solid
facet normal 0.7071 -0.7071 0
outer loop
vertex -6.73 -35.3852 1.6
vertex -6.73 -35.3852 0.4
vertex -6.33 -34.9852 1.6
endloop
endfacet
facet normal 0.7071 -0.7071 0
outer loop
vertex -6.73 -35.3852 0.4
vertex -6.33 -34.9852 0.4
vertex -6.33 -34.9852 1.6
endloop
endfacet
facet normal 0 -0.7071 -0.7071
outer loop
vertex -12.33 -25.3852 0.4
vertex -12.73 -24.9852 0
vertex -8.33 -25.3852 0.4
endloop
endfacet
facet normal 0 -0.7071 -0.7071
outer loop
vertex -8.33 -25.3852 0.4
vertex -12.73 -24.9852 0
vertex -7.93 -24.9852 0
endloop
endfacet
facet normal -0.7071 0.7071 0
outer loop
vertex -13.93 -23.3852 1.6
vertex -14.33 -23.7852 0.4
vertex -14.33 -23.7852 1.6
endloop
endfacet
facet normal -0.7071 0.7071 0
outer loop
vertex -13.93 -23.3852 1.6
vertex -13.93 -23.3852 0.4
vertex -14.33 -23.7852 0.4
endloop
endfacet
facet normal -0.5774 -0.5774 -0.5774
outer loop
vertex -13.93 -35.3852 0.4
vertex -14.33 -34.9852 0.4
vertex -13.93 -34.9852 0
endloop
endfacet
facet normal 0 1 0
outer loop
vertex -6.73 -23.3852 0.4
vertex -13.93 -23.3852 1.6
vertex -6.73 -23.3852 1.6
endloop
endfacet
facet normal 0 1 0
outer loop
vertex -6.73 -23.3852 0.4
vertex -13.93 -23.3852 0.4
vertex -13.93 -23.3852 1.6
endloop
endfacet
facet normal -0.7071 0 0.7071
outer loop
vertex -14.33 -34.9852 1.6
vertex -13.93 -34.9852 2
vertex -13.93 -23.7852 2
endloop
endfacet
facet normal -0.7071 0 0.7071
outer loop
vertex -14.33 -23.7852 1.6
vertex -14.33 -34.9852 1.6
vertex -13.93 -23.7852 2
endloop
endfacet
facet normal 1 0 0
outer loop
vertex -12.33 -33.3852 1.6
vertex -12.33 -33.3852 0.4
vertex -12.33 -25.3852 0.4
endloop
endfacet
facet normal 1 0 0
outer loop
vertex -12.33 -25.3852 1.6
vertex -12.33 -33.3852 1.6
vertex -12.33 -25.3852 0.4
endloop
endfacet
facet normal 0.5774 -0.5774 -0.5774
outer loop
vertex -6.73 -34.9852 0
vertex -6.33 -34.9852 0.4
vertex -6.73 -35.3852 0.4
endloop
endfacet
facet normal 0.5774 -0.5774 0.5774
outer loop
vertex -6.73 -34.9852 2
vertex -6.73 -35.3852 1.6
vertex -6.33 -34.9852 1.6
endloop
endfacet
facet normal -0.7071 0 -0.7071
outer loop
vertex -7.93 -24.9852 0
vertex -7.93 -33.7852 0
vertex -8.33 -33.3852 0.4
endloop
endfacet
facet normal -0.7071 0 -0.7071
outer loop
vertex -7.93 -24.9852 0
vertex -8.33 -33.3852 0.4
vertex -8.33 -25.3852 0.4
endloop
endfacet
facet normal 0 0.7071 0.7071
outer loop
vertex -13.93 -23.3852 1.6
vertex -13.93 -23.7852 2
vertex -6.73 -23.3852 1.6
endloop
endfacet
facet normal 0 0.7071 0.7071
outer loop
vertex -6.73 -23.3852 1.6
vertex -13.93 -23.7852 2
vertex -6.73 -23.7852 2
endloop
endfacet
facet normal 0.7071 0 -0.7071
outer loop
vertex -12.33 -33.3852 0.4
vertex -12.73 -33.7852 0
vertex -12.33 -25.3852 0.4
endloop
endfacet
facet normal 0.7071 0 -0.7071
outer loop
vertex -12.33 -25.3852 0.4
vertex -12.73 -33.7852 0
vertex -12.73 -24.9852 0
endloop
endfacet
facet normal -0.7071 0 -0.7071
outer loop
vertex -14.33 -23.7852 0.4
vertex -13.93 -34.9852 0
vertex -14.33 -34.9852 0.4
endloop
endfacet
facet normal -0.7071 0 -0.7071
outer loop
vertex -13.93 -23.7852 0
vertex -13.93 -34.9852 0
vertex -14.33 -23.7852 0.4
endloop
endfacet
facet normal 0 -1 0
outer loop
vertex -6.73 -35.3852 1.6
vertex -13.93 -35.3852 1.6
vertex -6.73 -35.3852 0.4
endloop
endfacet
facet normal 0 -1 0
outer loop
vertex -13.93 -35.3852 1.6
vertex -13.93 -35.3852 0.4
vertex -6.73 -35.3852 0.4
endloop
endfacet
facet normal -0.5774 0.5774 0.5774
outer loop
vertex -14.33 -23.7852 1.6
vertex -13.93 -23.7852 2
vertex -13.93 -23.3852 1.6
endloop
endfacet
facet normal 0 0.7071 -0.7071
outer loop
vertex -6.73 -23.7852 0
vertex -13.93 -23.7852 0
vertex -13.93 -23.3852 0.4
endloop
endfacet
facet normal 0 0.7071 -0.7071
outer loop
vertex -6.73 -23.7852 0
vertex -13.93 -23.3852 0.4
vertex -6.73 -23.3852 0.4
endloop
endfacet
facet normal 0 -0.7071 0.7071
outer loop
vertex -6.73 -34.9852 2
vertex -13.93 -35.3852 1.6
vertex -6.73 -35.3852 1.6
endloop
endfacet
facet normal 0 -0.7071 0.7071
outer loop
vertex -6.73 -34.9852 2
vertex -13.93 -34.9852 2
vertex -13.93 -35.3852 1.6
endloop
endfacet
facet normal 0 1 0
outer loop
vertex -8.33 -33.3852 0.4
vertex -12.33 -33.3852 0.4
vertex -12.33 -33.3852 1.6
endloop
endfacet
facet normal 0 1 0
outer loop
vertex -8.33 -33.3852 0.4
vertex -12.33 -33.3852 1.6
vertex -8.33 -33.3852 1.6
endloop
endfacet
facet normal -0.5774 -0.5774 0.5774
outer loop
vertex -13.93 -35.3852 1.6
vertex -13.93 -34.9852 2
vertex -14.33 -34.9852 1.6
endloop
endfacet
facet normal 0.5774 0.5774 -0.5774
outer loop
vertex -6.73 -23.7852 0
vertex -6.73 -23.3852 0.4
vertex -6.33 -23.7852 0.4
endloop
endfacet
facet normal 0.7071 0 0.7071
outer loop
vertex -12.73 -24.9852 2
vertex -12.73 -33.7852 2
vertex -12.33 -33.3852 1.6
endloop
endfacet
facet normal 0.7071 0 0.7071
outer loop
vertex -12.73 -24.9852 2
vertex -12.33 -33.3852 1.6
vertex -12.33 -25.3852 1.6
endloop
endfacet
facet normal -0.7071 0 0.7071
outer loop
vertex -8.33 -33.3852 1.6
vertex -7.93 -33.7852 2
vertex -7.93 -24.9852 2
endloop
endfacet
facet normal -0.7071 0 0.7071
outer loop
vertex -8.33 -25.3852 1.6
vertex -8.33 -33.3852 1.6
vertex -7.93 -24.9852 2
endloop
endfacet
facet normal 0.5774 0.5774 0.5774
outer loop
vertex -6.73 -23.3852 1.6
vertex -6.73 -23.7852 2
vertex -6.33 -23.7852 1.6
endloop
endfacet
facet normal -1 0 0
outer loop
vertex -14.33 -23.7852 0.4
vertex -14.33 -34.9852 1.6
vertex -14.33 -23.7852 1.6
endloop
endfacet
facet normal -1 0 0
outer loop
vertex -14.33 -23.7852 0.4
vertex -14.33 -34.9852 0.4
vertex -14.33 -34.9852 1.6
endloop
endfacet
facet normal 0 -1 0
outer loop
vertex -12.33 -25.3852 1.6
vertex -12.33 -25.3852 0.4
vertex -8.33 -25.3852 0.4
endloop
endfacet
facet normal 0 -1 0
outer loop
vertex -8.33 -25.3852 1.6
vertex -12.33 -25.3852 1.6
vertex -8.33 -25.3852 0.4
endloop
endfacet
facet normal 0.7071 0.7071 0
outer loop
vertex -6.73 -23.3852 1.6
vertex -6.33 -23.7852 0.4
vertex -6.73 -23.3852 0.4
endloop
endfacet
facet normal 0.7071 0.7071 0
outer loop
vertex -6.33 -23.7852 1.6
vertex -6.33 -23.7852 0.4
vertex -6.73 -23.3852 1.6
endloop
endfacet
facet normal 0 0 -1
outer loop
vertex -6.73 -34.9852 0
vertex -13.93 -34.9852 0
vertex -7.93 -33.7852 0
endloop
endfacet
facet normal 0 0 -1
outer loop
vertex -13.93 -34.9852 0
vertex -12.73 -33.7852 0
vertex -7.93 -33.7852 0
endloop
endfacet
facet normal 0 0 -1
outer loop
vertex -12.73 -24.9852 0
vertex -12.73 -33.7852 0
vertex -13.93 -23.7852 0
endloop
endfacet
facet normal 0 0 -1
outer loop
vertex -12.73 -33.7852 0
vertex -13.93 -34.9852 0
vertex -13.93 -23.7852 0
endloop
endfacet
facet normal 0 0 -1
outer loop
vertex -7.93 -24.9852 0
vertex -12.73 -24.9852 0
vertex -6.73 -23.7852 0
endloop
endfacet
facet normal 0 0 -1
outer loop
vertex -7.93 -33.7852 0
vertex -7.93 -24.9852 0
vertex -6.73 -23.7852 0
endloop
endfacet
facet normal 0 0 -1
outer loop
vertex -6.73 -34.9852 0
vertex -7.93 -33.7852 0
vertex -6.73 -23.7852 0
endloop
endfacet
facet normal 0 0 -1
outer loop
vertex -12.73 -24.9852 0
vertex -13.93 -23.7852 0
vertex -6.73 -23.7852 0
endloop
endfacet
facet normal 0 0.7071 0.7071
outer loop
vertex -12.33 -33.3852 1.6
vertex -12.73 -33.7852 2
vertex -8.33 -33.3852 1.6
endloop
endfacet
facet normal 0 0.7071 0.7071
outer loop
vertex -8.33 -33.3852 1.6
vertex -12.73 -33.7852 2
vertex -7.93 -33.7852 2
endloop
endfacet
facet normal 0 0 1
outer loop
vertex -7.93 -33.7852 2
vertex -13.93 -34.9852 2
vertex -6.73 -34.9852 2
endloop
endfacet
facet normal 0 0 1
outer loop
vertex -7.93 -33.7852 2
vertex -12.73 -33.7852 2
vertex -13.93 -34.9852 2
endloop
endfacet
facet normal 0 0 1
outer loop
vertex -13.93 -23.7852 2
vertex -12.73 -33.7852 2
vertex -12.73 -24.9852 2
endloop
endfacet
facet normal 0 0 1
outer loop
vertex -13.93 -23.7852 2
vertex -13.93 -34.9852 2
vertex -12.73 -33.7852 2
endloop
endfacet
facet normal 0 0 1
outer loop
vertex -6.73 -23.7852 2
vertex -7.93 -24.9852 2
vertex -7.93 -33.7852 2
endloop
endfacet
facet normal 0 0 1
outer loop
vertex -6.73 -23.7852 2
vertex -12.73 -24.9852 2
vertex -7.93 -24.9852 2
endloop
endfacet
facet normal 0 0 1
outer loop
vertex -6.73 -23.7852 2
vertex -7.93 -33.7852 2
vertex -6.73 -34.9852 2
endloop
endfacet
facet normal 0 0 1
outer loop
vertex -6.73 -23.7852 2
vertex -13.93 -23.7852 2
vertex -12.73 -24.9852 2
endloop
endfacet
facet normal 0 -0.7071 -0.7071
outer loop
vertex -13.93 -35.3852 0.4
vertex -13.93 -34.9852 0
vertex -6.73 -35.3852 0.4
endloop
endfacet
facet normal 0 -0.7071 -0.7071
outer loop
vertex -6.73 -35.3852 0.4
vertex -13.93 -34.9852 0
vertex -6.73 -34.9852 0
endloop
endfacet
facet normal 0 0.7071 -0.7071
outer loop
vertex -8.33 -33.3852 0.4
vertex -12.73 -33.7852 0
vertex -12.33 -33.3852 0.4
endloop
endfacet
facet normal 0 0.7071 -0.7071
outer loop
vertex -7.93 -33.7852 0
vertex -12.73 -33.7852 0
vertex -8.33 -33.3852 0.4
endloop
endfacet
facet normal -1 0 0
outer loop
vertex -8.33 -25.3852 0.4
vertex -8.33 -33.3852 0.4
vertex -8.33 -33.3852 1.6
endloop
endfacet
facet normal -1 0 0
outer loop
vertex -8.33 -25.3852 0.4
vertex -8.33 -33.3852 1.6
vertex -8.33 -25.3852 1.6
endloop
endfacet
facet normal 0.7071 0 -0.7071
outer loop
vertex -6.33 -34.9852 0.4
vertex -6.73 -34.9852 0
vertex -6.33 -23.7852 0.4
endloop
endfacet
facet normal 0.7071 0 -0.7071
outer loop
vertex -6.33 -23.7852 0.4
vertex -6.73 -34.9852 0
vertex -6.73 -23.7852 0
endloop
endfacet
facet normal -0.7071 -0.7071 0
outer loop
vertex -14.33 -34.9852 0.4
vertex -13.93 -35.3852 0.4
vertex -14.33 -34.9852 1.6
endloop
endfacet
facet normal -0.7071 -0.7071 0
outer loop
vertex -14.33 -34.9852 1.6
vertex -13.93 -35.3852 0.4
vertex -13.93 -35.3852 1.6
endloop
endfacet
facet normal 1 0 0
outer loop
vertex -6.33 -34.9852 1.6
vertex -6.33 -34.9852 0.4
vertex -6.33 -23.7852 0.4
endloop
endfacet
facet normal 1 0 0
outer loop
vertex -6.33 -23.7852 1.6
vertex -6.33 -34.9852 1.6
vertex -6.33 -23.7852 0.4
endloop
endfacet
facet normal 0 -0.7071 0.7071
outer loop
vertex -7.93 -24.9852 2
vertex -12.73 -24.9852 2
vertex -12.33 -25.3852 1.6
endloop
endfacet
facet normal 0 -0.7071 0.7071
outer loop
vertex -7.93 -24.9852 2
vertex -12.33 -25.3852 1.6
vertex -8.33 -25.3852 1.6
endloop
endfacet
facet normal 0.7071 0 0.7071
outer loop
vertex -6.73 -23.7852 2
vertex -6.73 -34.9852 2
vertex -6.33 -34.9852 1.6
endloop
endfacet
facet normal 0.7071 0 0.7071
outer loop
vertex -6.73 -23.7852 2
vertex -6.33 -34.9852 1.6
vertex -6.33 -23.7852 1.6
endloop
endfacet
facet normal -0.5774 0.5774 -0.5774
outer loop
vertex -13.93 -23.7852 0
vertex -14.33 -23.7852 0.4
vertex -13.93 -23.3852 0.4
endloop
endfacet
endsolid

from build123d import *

# Parameters (mm, degrees)
F0_W     = 8
F0_H     = 12
F0_W_2   = 4
F0_H_2   = 8
F1_DEPTH = 2
F2_SIZE  = 0.4


with BuildPart() as f1:
    # F0 (on Top) → F1 (new body)
    with BuildSketch(Plane.XY):
        with Locations((-10.329974, -29.385177)):
            Rectangle(F0_W, F0_H)
        with Locations((-10.329974, -29.385177)):
            Rectangle(F0_W_2, F0_H_2, mode=Mode.SUBTRACT)
    extrude(amount=F1_DEPTH)

    # F2
    f2_edges = [f1.edges().sort_by_distance(p)[0] for p in [
        (-8.329974, -29.385177, 2),
        (-10.329974, -33.385177, 2),
        (-12.329974, -29.385177, 2),
        (-10.329974, -25.385177, 2),
        (-10.329974, -35.385177, 2),
        (-14.329974, -29.385177, 2),
        (-14.329974, -35.385177, 1),
        (-6.329974, -35.385177, 1),
        (-6.329974, -29.385177, 2),
        (-10.329974, -23.385177, 2),
        (-6.329974, -23.385177, 1),
        (-14.329974, -23.385177, 1),
        (-14.329974, -29.385177, 0),
        (-12.329974, -29.385177, 0),
        (-10.329974, -25.385177, 0),
        (-10.329974, -23.385177, 0),
        (-6.329974, -29.385177, 0),
        (-8.329974, -29.385177, 0),
        (-10.329974, -33.385177, 0),
        (-10.329974, -35.385177, 0),
    ]]
    chamfer(f2_edges, length=F2_SIZE)


solid = f1.part
